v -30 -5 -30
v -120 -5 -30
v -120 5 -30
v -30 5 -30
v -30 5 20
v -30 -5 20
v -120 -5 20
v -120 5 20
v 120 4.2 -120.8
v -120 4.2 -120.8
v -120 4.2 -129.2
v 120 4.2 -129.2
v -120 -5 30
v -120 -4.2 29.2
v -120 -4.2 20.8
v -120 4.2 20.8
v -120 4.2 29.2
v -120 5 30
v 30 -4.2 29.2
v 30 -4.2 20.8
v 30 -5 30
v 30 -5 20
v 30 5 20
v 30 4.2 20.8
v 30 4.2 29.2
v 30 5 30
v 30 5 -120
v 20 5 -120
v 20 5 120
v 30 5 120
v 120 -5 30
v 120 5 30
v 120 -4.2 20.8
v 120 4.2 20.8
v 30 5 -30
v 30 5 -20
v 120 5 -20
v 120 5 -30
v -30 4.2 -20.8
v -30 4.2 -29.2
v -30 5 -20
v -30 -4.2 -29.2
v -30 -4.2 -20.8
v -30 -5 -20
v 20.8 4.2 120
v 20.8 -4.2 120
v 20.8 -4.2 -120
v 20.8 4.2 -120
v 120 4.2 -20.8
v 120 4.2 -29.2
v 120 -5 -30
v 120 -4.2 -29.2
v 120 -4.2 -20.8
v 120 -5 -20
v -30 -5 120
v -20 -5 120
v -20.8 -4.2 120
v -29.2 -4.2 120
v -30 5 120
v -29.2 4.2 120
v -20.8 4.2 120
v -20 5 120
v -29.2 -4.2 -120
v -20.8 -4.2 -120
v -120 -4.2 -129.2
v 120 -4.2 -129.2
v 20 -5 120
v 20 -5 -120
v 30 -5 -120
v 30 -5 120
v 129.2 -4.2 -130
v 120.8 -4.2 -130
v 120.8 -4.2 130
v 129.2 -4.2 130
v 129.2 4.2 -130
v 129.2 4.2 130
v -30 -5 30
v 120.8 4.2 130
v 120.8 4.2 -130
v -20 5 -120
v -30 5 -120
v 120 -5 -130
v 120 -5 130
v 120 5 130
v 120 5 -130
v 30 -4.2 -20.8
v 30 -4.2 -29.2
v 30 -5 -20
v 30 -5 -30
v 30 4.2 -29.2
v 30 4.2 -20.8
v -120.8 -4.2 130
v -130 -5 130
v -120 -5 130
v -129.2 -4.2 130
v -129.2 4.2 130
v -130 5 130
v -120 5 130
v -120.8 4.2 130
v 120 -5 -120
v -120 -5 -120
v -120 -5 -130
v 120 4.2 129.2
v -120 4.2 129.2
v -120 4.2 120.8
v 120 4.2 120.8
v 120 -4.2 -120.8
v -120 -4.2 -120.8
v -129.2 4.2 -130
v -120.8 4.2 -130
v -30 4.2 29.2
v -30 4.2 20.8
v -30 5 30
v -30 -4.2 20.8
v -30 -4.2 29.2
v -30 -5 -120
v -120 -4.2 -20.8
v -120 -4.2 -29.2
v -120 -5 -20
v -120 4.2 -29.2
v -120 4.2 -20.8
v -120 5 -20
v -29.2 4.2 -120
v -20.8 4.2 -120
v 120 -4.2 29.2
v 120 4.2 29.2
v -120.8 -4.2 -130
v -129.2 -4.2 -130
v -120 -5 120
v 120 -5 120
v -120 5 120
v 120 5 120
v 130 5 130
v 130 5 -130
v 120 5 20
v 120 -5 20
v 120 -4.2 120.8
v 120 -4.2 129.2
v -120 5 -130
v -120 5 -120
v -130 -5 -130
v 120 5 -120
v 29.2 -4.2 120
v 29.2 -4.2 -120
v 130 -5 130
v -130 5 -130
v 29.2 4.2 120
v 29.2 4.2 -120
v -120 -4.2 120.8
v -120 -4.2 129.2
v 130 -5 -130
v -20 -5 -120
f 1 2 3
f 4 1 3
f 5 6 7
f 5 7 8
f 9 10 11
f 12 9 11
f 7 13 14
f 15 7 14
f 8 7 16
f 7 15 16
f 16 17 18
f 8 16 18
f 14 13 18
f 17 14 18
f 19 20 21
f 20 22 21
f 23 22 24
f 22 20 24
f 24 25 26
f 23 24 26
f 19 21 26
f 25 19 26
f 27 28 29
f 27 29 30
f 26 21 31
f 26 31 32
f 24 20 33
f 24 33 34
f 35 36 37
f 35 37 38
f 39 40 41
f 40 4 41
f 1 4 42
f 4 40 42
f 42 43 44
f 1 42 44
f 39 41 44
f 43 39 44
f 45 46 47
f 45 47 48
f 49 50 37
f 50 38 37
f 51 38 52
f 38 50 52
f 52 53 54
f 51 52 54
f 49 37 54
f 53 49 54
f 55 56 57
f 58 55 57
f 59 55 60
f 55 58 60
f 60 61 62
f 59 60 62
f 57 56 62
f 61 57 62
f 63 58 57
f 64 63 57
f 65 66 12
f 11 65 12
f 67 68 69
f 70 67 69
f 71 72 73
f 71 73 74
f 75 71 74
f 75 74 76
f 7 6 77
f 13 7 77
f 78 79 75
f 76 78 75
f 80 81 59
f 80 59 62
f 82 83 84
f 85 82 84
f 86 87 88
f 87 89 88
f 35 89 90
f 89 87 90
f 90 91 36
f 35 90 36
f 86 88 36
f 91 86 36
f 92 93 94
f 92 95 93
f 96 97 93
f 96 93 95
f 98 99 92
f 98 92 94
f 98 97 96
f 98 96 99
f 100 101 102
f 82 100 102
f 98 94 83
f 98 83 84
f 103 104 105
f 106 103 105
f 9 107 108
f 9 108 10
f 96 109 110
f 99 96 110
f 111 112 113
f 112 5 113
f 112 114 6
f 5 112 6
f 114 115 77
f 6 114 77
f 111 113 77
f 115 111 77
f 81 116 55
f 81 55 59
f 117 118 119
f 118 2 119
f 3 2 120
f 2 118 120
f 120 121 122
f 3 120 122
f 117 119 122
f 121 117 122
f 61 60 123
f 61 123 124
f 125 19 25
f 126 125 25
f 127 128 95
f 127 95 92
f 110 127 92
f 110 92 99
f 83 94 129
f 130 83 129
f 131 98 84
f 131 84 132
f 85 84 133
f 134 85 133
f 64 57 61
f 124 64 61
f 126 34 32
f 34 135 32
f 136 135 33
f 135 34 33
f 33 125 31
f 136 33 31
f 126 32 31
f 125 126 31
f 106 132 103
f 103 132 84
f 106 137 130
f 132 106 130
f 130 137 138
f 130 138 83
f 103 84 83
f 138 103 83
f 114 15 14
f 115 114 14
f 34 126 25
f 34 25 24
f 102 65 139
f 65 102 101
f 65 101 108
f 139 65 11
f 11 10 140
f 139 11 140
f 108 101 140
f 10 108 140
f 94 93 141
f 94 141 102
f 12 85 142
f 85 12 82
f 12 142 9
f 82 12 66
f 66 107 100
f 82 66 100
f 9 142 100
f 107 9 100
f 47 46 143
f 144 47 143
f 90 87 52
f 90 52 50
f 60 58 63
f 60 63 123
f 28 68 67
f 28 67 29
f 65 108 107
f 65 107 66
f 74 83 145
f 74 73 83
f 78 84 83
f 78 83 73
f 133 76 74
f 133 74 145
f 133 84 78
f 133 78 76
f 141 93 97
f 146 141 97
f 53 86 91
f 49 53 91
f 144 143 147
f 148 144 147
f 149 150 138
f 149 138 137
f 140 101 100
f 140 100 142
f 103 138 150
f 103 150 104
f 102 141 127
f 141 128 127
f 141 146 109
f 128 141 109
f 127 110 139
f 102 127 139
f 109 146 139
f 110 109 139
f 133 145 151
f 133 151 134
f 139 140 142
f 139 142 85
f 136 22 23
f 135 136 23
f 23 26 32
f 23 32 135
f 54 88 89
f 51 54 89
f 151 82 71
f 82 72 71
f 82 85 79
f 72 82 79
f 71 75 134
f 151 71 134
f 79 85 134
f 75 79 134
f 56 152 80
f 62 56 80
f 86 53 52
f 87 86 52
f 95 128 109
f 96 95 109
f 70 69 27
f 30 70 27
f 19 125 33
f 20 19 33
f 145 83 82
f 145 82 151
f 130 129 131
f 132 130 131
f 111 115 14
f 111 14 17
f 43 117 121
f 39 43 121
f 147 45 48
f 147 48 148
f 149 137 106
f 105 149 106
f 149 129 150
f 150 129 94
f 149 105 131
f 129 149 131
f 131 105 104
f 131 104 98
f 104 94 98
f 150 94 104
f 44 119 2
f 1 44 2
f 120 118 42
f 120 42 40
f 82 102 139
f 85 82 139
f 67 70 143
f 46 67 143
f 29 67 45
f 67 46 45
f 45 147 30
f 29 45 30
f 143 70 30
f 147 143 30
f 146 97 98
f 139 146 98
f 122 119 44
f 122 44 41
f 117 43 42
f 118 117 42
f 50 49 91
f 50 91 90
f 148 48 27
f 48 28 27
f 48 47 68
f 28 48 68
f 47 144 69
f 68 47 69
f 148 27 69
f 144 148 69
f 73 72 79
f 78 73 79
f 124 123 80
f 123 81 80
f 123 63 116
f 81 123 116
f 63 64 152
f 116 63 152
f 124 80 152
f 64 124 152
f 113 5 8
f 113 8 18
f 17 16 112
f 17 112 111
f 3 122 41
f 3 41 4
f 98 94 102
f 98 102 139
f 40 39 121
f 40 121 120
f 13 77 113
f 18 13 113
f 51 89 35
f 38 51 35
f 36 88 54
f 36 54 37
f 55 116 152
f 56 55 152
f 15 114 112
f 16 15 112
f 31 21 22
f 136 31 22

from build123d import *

# Parameters (mm, degrees)
INOX_VU_NG_CONFIGURED_10X0_8_1_DEPTH      = 255
INOX_VU_NG_CONFIGURED_10X0_8_1_DEPTH_BACK = 5
SKETCH11_W                                = 10
SKETCH11_H                                = 10
SKETCH11_W_2                              = 8.4
SKETCH11_H_2                              = 8.4
SKETCH11_ON_SEGMENT_2_W                   = 10
SKETCH11_ON_SEGMENT_2_H                   = 10
SKETCH11_ON_SEGMENT_2_W_2                 = 8.4
SKETCH11_ON_SEGMENT_2_H_2                 = 8.4
INOX_VU_NG_CONFIGURED_10X0_8_1_2_DEPTH    = 252
SKETCH11_ON_SEGMENT_3_W                   = 10
SKETCH11_ON_SEGMENT_3_H                   = 10
SKETCH11_ON_SEGMENT_3_W_2                 = 8.4
SKETCH11_ON_SEGMENT_3_H_2                 = 8.4
INOX_VU_NG_CONFIGURED_10X0_8_1_3_DEPTH    = 252
SKETCH11_ON_SEGMENT_4_W                   = 10
SKETCH11_ON_SEGMENT_4_H                   = 10
SKETCH11_ON_SEGMENT_4_W_2                 = 8.4
SKETCH11_ON_SEGMENT_4_H_2                 = 8.4
INOX_VU_NG_CONFIGURED_10X0_8_1_4_DEPTH    = 260
SKETCH11_ON_SEGMENT_5_W                   = 10
SKETCH11_ON_SEGMENT_5_H                   = 10
SKETCH11_ON_SEGMENT_5_W_2                 = 8.4
SKETCH11_ON_SEGMENT_5_H_2                 = 8.4
INOX_VU_NG_CONFIGURED_10X0_8_1_5_DEPTH    = 252
SKETCH11_ON_SEGMENT_6_W                   = 10
SKETCH11_ON_SEGMENT_6_H                   = 10
SKETCH11_ON_SEGMENT_6_W_2                 = 8.4
SKETCH11_ON_SEGMENT_6_H_2                 = 8.4
INOX_VU_NG_CONFIGURED_10X0_8_1_6_DEPTH    = 252
SKETCH11_ON_SEGMENT_7_W                   = 10
SKETCH11_ON_SEGMENT_7_H                   = 10
SKETCH11_ON_SEGMENT_7_W_2                 = 8.4
SKETCH11_ON_SEGMENT_7_H_2                 = 8.4
INOX_VU_NG_CONFIGURED_10X0_8_1_7_DEPTH    = 102
SKETCH11_ON_SEGMENT_8_W                   = 10
SKETCH11_ON_SEGMENT_8_H                   = 10
SKETCH11_ON_SEGMENT_8_W_2                 = 8.4
SKETCH11_ON_SEGMENT_8_H_2                 = 8.4
INOX_VU_NG_CONFIGURED_10X0_8_1_8_DEPTH    = 102
SKETCH11_ON_SEGMENT_9_W                   = 10
SKETCH11_ON_SEGMENT_9_H                   = 10
SKETCH11_ON_SEGMENT_9_W_2                 = 8.4
SKETCH11_ON_SEGMENT_9_H_2                 = 8.4
INOX_VU_NG_CONFIGURED_10X0_8_1_9_DEPTH    = 102
SKETCH11_ON_SEGMENT_10_W                  = 10
SKETCH11_ON_SEGMENT_10_H                  = 10
SKETCH11_ON_SEGMENT_10_W_2                = 8.4
SKETCH11_ON_SEGMENT_10_H_2                = 8.4
INOX_VU_NG_CONFIGURED_10X0_8_1_10_DEPTH   = 102


with BuildPart() as part:
    # Sketch11 → Inox vuông - configured 10X0.8(1) (new, two sides: drawn at the far end of the back side and taken through both)
    with BuildSketch(Plane(origin=(-125, 0, -125), x_dir=(1, 0, 0), z_dir=(0, 0, 1)).offset(-INOX_VU_NG_CONFIGURED_10X0_8_1_DEPTH_BACK)):
        Rectangle(SKETCH11_W, SKETCH11_H)
        Rectangle(SKETCH11_W_2, SKETCH11_H_2, mode=Mode.SUBTRACT)
    extrude(amount=INOX_VU_NG_CONFIGURED_10X0_8_1_DEPTH + INOX_VU_NG_CONFIGURED_10X0_8_1_DEPTH_BACK)


with BuildPart() as body_2:
    # Sketch11 on segment 2 (carried to segment 2) → Inox vu_ng - configured 10X0.8_1 2 (new body)
    with BuildSketch(Plane(origin=(-25, 0, -126), x_dir=(1, 0, 0), z_dir=(0, 0, 1))):
        Rectangle(SKETCH11_ON_SEGMENT_2_W, SKETCH11_ON_SEGMENT_2_H)
        Rectangle(SKETCH11_ON_SEGMENT_2_W_2, SKETCH11_ON_SEGMENT_2_H_2, mode=Mode.SUBTRACT)
    extrude(amount=INOX_VU_NG_CONFIGURED_10X0_8_1_2_DEPTH)

    # Inox vu_ng - configured 10X0.8_1 2 end b
    split(bisect_by=Plane(origin=(-25, 0, -120), x_dir=(0, -1, 0), z_dir=(0, 0, 1)), keep=Keep.TOP)

    # Inox vu_ng - configured 10X0.8_1 2 e 2
    split(bisect_by=Plane(origin=(-25, 0, 120), x_dir=(0, 1, 0), z_dir=(0, 0, -1)), keep=Keep.TOP)


with BuildPart() as body_3:
    # Sketch11 on segment 3 (carried to segment 3) → Inox vu_ng - configured 10X0.8_1 3 (new body)
    with BuildSketch(Plane(origin=(25, 0, -126), x_dir=(1, 0, 0), z_dir=(0, 0, 1))):
        Rectangle(SKETCH11_ON_SEGMENT_3_W, SKETCH11_ON_SEGMENT_3_H)
        Rectangle(SKETCH11_ON_SEGMENT_3_W_2, SKETCH11_ON_SEGMENT_3_H_2, mode=Mode.SUBTRACT)
    extrude(amount=INOX_VU_NG_CONFIGURED_10X0_8_1_3_DEPTH)

    # Inox vu_ng - configured 10X0.8_1 3 end b
    split(bisect_by=Plane(origin=(25, 0, -120), x_dir=(0, -1, 0), z_dir=(0, 0, 1)), keep=Keep.TOP)

    # Inox vu_ng - configured 10X0.8_1 3 e 2
    split(bisect_by=Plane(origin=(25, 0, 120), x_dir=(0, 1, 0), z_dir=(0, 0, -1)), keep=Keep.TOP)


with BuildPart() as body_4:
    # Sketch11 on segment 4 (carried to segment 4) → Inox vu_ng - configured 10X0.8_1 4 (new body)
    with BuildSketch(Plane(origin=(125, 0, -130), x_dir=(1, 0, 0), z_dir=(0, 0, 1))):
        Rectangle(SKETCH11_ON_SEGMENT_4_W, SKETCH11_ON_SEGMENT_4_H)
        Rectangle(SKETCH11_ON_SEGMENT_4_W_2, SKETCH11_ON_SEGMENT_4_H_2, mode=Mode.SUBTRACT)
    extrude(amount=INOX_VU_NG_CONFIGURED_10X0_8_1_4_DEPTH)


with BuildPart() as body_5:
    # Sketch11 on segment 5 (carried to segment 5) → Inox vu_ng - configured 10X0.8_1 5 (new body)
    with BuildSketch(Plane(origin=(-126, 0, -125), x_dir=(0, 0, -1), z_dir=(1, 0, 0))):
        Rectangle(SKETCH11_ON_SEGMENT_5_W, SKETCH11_ON_SEGMENT_5_H)
        Rectangle(SKETCH11_ON_SEGMENT_5_W_2, SKETCH11_ON_SEGMENT_5_H_2, mode=Mode.SUBTRACT)
    extrude(amount=INOX_VU_NG_CONFIGURED_10X0_8_1_5_DEPTH)

    # Inox vu_ng - configured 10X0.8_1 5 end b
    split(bisect_by=Plane(origin=(-120, 0, -125), x_dir=(0, 1, 0), z_dir=(1, 0, 0)), keep=Keep.TOP)

    # Inox vu_ng - configured 10X0.8_1 5 e 2
    split(bisect_by=Plane(origin=(120, 0, -125), x_dir=(0, -1, 0), z_dir=(-1, 0, 0)), keep=Keep.TOP)


with BuildPart() as body_6:
    # Sketch11 on segment 6 (carried to segment 6) → Inox vu_ng - configured 10X0.8_1 6 (new body)
    with BuildSketch(Plane(origin=(-126, 0, 125), x_dir=(0, 0, -1), z_dir=(1, 0, 0))):
        Rectangle(SKETCH11_ON_SEGMENT_6_W, SKETCH11_ON_SEGMENT_6_H)
        Rectangle(SKETCH11_ON_SEGMENT_6_W_2, SKETCH11_ON_SEGMENT_6_H_2, mode=Mode.SUBTRACT)
    extrude(amount=INOX_VU_NG_CONFIGURED_10X0_8_1_6_DEPTH)

    # Inox vu_ng - configured 10X0.8_1 6 end b
    split(bisect_by=Plane(origin=(-120, 0, 125), x_dir=(0, 1, 0), z_dir=(1, 0, 0)), keep=Keep.TOP)

    # Inox vu_ng - configured 10X0.8_1 6 e 2
    split(bisect_by=Plane(origin=(120, 0, 125), x_dir=(0, -1, 0), z_dir=(-1, 0, 0)), keep=Keep.TOP)


with BuildPart() as body_7:
    # Sketch11 on segment 7 (carried to segment 7) → Inox vu_ng - configured 10X0.8_1 7 (new body)
    with BuildSketch(Plane(origin=(-24, 0, 25), x_dir=(0, 0, 1), z_dir=(-1, 0, 0))):
        Rectangle(SKETCH11_ON_SEGMENT_7_W, SKETCH11_ON_SEGMENT_7_H)
        Rectangle(SKETCH11_ON_SEGMENT_7_W_2, SKETCH11_ON_SEGMENT_7_H_2, mode=Mode.SUBTRACT)
    extrude(amount=INOX_VU_NG_CONFIGURED_10X0_8_1_7_DEPTH)

    # Inox vu_ng - configured 10X0.8_1 7 end b
    split(bisect_by=Plane(origin=(-30, 0, 25), x_dir=(0, -1, 0), z_dir=(-1, 0, 0)), keep=Keep.TOP)

    # Inox vu_ng - configured 10X0.8_1 7 e 2
    split(bisect_by=Plane(origin=(-120, 0, 25), x_dir=(0, 1, 0), z_dir=(1, 0, 0)), keep=Keep.TOP)


with BuildPart() as body_8:
    # Sketch11 on segment 8 (carried to segment 8) → Inox vu_ng - configured 10X0.8_1 8 (new body)
    with BuildSketch(Plane(origin=(-126, 0, -25), x_dir=(0, 0, -1), z_dir=(1, 0, 0))):
        Rectangle(SKETCH11_ON_SEGMENT_8_W, SKETCH11_ON_SEGMENT_8_H)
        Rectangle(SKETCH11_ON_SEGMENT_8_W_2, SKETCH11_ON_SEGMENT_8_H_2, mode=Mode.SUBTRACT)
    extrude(amount=INOX_VU_NG_CONFIGURED_10X0_8_1_8_DEPTH)

    # Inox vu_ng - configured 10X0.8_1 8 end b
    split(bisect_by=Plane(origin=(-120, 0, -25), x_dir=(0, 1, 0), z_dir=(1, 0, 0)), keep=Keep.TOP)

    # Inox vu_ng - configured 10X0.8_1 8 e 2
    split(bisect_by=Plane(origin=(-30, 0, -25), x_dir=(0, -1, 0), z_dir=(-1, 0, 0)), keep=Keep.TOP)


with BuildPart() as body_9:
    # Sketch11 on segment 9 (carried to segment 9) → Inox vu_ng - configured 10X0.8_1 9 (new body)
    with BuildSketch(Plane(origin=(24, 0, -25), x_dir=(0, 0, -1), z_dir=(1, 0, 0))):
        Rectangle(SKETCH11_ON_SEGMENT_9_W, SKETCH11_ON_SEGMENT_9_H)
        Rectangle(SKETCH11_ON_SEGMENT_9_W_2, SKETCH11_ON_SEGMENT_9_H_2, mode=Mode.SUBTRACT)
    extrude(amount=INOX_VU_NG_CONFIGURED_10X0_8_1_9_DEPTH)

    # Inox vu_ng - configured 10X0.8_1 9 end b
    split(bisect_by=Plane(origin=(30, 0, -25), x_dir=(0, 1, 0), z_dir=(1, 0, 0)), keep=Keep.TOP)

    # Inox vu_ng - configured 10X0.8_1 9 e 2
    split(bisect_by=Plane(origin=(120, 0, -25), x_dir=(0, -1, 0), z_dir=(-1, 0, 0)), keep=Keep.TOP)


with BuildPart() as body_10:
    # Sketch11 on segment 10 (carried to segment 10) → Inox vu_ng - configured 10X0.8_1 10 (new body)
    with BuildSketch(Plane(origin=(24, 0, 25), x_dir=(0, 0, -1), z_dir=(1, 0, 0))):
        Rectangle(SKETCH11_ON_SEGMENT_10_W, SKETCH11_ON_SEGMENT_10_H)
        Rectangle(SKETCH11_ON_SEGMENT_10_W_2, SKETCH11_ON_SEGMENT_10_H_2, mode=Mode.SUBTRACT)
    extrude(amount=INOX_VU_NG_CONFIGURED_10X0_8_1_10_DEPTH)

    # Inox vu_ng - configured 10X0.8_1 10 end
    split(bisect_by=Plane(origin=(30, 0, 25), x_dir=(0, 1, 0), z_dir=(1, 0, 0)), keep=Keep.TOP)

    # Inox vu_ng - configured 10X0.8_1 10  2
    split(bisect_by=Plane(origin=(120, 0, 25), x_dir=(0, -1, 0), z_dir=(-1, 0, 0)), keep=Keep.TOP)


solid = Compound([part.part, body_2.part, body_3.part, body_4.part, body_5.part, body_6.part, body_7.part, body_8.part, body_9.part, body_10.part])
